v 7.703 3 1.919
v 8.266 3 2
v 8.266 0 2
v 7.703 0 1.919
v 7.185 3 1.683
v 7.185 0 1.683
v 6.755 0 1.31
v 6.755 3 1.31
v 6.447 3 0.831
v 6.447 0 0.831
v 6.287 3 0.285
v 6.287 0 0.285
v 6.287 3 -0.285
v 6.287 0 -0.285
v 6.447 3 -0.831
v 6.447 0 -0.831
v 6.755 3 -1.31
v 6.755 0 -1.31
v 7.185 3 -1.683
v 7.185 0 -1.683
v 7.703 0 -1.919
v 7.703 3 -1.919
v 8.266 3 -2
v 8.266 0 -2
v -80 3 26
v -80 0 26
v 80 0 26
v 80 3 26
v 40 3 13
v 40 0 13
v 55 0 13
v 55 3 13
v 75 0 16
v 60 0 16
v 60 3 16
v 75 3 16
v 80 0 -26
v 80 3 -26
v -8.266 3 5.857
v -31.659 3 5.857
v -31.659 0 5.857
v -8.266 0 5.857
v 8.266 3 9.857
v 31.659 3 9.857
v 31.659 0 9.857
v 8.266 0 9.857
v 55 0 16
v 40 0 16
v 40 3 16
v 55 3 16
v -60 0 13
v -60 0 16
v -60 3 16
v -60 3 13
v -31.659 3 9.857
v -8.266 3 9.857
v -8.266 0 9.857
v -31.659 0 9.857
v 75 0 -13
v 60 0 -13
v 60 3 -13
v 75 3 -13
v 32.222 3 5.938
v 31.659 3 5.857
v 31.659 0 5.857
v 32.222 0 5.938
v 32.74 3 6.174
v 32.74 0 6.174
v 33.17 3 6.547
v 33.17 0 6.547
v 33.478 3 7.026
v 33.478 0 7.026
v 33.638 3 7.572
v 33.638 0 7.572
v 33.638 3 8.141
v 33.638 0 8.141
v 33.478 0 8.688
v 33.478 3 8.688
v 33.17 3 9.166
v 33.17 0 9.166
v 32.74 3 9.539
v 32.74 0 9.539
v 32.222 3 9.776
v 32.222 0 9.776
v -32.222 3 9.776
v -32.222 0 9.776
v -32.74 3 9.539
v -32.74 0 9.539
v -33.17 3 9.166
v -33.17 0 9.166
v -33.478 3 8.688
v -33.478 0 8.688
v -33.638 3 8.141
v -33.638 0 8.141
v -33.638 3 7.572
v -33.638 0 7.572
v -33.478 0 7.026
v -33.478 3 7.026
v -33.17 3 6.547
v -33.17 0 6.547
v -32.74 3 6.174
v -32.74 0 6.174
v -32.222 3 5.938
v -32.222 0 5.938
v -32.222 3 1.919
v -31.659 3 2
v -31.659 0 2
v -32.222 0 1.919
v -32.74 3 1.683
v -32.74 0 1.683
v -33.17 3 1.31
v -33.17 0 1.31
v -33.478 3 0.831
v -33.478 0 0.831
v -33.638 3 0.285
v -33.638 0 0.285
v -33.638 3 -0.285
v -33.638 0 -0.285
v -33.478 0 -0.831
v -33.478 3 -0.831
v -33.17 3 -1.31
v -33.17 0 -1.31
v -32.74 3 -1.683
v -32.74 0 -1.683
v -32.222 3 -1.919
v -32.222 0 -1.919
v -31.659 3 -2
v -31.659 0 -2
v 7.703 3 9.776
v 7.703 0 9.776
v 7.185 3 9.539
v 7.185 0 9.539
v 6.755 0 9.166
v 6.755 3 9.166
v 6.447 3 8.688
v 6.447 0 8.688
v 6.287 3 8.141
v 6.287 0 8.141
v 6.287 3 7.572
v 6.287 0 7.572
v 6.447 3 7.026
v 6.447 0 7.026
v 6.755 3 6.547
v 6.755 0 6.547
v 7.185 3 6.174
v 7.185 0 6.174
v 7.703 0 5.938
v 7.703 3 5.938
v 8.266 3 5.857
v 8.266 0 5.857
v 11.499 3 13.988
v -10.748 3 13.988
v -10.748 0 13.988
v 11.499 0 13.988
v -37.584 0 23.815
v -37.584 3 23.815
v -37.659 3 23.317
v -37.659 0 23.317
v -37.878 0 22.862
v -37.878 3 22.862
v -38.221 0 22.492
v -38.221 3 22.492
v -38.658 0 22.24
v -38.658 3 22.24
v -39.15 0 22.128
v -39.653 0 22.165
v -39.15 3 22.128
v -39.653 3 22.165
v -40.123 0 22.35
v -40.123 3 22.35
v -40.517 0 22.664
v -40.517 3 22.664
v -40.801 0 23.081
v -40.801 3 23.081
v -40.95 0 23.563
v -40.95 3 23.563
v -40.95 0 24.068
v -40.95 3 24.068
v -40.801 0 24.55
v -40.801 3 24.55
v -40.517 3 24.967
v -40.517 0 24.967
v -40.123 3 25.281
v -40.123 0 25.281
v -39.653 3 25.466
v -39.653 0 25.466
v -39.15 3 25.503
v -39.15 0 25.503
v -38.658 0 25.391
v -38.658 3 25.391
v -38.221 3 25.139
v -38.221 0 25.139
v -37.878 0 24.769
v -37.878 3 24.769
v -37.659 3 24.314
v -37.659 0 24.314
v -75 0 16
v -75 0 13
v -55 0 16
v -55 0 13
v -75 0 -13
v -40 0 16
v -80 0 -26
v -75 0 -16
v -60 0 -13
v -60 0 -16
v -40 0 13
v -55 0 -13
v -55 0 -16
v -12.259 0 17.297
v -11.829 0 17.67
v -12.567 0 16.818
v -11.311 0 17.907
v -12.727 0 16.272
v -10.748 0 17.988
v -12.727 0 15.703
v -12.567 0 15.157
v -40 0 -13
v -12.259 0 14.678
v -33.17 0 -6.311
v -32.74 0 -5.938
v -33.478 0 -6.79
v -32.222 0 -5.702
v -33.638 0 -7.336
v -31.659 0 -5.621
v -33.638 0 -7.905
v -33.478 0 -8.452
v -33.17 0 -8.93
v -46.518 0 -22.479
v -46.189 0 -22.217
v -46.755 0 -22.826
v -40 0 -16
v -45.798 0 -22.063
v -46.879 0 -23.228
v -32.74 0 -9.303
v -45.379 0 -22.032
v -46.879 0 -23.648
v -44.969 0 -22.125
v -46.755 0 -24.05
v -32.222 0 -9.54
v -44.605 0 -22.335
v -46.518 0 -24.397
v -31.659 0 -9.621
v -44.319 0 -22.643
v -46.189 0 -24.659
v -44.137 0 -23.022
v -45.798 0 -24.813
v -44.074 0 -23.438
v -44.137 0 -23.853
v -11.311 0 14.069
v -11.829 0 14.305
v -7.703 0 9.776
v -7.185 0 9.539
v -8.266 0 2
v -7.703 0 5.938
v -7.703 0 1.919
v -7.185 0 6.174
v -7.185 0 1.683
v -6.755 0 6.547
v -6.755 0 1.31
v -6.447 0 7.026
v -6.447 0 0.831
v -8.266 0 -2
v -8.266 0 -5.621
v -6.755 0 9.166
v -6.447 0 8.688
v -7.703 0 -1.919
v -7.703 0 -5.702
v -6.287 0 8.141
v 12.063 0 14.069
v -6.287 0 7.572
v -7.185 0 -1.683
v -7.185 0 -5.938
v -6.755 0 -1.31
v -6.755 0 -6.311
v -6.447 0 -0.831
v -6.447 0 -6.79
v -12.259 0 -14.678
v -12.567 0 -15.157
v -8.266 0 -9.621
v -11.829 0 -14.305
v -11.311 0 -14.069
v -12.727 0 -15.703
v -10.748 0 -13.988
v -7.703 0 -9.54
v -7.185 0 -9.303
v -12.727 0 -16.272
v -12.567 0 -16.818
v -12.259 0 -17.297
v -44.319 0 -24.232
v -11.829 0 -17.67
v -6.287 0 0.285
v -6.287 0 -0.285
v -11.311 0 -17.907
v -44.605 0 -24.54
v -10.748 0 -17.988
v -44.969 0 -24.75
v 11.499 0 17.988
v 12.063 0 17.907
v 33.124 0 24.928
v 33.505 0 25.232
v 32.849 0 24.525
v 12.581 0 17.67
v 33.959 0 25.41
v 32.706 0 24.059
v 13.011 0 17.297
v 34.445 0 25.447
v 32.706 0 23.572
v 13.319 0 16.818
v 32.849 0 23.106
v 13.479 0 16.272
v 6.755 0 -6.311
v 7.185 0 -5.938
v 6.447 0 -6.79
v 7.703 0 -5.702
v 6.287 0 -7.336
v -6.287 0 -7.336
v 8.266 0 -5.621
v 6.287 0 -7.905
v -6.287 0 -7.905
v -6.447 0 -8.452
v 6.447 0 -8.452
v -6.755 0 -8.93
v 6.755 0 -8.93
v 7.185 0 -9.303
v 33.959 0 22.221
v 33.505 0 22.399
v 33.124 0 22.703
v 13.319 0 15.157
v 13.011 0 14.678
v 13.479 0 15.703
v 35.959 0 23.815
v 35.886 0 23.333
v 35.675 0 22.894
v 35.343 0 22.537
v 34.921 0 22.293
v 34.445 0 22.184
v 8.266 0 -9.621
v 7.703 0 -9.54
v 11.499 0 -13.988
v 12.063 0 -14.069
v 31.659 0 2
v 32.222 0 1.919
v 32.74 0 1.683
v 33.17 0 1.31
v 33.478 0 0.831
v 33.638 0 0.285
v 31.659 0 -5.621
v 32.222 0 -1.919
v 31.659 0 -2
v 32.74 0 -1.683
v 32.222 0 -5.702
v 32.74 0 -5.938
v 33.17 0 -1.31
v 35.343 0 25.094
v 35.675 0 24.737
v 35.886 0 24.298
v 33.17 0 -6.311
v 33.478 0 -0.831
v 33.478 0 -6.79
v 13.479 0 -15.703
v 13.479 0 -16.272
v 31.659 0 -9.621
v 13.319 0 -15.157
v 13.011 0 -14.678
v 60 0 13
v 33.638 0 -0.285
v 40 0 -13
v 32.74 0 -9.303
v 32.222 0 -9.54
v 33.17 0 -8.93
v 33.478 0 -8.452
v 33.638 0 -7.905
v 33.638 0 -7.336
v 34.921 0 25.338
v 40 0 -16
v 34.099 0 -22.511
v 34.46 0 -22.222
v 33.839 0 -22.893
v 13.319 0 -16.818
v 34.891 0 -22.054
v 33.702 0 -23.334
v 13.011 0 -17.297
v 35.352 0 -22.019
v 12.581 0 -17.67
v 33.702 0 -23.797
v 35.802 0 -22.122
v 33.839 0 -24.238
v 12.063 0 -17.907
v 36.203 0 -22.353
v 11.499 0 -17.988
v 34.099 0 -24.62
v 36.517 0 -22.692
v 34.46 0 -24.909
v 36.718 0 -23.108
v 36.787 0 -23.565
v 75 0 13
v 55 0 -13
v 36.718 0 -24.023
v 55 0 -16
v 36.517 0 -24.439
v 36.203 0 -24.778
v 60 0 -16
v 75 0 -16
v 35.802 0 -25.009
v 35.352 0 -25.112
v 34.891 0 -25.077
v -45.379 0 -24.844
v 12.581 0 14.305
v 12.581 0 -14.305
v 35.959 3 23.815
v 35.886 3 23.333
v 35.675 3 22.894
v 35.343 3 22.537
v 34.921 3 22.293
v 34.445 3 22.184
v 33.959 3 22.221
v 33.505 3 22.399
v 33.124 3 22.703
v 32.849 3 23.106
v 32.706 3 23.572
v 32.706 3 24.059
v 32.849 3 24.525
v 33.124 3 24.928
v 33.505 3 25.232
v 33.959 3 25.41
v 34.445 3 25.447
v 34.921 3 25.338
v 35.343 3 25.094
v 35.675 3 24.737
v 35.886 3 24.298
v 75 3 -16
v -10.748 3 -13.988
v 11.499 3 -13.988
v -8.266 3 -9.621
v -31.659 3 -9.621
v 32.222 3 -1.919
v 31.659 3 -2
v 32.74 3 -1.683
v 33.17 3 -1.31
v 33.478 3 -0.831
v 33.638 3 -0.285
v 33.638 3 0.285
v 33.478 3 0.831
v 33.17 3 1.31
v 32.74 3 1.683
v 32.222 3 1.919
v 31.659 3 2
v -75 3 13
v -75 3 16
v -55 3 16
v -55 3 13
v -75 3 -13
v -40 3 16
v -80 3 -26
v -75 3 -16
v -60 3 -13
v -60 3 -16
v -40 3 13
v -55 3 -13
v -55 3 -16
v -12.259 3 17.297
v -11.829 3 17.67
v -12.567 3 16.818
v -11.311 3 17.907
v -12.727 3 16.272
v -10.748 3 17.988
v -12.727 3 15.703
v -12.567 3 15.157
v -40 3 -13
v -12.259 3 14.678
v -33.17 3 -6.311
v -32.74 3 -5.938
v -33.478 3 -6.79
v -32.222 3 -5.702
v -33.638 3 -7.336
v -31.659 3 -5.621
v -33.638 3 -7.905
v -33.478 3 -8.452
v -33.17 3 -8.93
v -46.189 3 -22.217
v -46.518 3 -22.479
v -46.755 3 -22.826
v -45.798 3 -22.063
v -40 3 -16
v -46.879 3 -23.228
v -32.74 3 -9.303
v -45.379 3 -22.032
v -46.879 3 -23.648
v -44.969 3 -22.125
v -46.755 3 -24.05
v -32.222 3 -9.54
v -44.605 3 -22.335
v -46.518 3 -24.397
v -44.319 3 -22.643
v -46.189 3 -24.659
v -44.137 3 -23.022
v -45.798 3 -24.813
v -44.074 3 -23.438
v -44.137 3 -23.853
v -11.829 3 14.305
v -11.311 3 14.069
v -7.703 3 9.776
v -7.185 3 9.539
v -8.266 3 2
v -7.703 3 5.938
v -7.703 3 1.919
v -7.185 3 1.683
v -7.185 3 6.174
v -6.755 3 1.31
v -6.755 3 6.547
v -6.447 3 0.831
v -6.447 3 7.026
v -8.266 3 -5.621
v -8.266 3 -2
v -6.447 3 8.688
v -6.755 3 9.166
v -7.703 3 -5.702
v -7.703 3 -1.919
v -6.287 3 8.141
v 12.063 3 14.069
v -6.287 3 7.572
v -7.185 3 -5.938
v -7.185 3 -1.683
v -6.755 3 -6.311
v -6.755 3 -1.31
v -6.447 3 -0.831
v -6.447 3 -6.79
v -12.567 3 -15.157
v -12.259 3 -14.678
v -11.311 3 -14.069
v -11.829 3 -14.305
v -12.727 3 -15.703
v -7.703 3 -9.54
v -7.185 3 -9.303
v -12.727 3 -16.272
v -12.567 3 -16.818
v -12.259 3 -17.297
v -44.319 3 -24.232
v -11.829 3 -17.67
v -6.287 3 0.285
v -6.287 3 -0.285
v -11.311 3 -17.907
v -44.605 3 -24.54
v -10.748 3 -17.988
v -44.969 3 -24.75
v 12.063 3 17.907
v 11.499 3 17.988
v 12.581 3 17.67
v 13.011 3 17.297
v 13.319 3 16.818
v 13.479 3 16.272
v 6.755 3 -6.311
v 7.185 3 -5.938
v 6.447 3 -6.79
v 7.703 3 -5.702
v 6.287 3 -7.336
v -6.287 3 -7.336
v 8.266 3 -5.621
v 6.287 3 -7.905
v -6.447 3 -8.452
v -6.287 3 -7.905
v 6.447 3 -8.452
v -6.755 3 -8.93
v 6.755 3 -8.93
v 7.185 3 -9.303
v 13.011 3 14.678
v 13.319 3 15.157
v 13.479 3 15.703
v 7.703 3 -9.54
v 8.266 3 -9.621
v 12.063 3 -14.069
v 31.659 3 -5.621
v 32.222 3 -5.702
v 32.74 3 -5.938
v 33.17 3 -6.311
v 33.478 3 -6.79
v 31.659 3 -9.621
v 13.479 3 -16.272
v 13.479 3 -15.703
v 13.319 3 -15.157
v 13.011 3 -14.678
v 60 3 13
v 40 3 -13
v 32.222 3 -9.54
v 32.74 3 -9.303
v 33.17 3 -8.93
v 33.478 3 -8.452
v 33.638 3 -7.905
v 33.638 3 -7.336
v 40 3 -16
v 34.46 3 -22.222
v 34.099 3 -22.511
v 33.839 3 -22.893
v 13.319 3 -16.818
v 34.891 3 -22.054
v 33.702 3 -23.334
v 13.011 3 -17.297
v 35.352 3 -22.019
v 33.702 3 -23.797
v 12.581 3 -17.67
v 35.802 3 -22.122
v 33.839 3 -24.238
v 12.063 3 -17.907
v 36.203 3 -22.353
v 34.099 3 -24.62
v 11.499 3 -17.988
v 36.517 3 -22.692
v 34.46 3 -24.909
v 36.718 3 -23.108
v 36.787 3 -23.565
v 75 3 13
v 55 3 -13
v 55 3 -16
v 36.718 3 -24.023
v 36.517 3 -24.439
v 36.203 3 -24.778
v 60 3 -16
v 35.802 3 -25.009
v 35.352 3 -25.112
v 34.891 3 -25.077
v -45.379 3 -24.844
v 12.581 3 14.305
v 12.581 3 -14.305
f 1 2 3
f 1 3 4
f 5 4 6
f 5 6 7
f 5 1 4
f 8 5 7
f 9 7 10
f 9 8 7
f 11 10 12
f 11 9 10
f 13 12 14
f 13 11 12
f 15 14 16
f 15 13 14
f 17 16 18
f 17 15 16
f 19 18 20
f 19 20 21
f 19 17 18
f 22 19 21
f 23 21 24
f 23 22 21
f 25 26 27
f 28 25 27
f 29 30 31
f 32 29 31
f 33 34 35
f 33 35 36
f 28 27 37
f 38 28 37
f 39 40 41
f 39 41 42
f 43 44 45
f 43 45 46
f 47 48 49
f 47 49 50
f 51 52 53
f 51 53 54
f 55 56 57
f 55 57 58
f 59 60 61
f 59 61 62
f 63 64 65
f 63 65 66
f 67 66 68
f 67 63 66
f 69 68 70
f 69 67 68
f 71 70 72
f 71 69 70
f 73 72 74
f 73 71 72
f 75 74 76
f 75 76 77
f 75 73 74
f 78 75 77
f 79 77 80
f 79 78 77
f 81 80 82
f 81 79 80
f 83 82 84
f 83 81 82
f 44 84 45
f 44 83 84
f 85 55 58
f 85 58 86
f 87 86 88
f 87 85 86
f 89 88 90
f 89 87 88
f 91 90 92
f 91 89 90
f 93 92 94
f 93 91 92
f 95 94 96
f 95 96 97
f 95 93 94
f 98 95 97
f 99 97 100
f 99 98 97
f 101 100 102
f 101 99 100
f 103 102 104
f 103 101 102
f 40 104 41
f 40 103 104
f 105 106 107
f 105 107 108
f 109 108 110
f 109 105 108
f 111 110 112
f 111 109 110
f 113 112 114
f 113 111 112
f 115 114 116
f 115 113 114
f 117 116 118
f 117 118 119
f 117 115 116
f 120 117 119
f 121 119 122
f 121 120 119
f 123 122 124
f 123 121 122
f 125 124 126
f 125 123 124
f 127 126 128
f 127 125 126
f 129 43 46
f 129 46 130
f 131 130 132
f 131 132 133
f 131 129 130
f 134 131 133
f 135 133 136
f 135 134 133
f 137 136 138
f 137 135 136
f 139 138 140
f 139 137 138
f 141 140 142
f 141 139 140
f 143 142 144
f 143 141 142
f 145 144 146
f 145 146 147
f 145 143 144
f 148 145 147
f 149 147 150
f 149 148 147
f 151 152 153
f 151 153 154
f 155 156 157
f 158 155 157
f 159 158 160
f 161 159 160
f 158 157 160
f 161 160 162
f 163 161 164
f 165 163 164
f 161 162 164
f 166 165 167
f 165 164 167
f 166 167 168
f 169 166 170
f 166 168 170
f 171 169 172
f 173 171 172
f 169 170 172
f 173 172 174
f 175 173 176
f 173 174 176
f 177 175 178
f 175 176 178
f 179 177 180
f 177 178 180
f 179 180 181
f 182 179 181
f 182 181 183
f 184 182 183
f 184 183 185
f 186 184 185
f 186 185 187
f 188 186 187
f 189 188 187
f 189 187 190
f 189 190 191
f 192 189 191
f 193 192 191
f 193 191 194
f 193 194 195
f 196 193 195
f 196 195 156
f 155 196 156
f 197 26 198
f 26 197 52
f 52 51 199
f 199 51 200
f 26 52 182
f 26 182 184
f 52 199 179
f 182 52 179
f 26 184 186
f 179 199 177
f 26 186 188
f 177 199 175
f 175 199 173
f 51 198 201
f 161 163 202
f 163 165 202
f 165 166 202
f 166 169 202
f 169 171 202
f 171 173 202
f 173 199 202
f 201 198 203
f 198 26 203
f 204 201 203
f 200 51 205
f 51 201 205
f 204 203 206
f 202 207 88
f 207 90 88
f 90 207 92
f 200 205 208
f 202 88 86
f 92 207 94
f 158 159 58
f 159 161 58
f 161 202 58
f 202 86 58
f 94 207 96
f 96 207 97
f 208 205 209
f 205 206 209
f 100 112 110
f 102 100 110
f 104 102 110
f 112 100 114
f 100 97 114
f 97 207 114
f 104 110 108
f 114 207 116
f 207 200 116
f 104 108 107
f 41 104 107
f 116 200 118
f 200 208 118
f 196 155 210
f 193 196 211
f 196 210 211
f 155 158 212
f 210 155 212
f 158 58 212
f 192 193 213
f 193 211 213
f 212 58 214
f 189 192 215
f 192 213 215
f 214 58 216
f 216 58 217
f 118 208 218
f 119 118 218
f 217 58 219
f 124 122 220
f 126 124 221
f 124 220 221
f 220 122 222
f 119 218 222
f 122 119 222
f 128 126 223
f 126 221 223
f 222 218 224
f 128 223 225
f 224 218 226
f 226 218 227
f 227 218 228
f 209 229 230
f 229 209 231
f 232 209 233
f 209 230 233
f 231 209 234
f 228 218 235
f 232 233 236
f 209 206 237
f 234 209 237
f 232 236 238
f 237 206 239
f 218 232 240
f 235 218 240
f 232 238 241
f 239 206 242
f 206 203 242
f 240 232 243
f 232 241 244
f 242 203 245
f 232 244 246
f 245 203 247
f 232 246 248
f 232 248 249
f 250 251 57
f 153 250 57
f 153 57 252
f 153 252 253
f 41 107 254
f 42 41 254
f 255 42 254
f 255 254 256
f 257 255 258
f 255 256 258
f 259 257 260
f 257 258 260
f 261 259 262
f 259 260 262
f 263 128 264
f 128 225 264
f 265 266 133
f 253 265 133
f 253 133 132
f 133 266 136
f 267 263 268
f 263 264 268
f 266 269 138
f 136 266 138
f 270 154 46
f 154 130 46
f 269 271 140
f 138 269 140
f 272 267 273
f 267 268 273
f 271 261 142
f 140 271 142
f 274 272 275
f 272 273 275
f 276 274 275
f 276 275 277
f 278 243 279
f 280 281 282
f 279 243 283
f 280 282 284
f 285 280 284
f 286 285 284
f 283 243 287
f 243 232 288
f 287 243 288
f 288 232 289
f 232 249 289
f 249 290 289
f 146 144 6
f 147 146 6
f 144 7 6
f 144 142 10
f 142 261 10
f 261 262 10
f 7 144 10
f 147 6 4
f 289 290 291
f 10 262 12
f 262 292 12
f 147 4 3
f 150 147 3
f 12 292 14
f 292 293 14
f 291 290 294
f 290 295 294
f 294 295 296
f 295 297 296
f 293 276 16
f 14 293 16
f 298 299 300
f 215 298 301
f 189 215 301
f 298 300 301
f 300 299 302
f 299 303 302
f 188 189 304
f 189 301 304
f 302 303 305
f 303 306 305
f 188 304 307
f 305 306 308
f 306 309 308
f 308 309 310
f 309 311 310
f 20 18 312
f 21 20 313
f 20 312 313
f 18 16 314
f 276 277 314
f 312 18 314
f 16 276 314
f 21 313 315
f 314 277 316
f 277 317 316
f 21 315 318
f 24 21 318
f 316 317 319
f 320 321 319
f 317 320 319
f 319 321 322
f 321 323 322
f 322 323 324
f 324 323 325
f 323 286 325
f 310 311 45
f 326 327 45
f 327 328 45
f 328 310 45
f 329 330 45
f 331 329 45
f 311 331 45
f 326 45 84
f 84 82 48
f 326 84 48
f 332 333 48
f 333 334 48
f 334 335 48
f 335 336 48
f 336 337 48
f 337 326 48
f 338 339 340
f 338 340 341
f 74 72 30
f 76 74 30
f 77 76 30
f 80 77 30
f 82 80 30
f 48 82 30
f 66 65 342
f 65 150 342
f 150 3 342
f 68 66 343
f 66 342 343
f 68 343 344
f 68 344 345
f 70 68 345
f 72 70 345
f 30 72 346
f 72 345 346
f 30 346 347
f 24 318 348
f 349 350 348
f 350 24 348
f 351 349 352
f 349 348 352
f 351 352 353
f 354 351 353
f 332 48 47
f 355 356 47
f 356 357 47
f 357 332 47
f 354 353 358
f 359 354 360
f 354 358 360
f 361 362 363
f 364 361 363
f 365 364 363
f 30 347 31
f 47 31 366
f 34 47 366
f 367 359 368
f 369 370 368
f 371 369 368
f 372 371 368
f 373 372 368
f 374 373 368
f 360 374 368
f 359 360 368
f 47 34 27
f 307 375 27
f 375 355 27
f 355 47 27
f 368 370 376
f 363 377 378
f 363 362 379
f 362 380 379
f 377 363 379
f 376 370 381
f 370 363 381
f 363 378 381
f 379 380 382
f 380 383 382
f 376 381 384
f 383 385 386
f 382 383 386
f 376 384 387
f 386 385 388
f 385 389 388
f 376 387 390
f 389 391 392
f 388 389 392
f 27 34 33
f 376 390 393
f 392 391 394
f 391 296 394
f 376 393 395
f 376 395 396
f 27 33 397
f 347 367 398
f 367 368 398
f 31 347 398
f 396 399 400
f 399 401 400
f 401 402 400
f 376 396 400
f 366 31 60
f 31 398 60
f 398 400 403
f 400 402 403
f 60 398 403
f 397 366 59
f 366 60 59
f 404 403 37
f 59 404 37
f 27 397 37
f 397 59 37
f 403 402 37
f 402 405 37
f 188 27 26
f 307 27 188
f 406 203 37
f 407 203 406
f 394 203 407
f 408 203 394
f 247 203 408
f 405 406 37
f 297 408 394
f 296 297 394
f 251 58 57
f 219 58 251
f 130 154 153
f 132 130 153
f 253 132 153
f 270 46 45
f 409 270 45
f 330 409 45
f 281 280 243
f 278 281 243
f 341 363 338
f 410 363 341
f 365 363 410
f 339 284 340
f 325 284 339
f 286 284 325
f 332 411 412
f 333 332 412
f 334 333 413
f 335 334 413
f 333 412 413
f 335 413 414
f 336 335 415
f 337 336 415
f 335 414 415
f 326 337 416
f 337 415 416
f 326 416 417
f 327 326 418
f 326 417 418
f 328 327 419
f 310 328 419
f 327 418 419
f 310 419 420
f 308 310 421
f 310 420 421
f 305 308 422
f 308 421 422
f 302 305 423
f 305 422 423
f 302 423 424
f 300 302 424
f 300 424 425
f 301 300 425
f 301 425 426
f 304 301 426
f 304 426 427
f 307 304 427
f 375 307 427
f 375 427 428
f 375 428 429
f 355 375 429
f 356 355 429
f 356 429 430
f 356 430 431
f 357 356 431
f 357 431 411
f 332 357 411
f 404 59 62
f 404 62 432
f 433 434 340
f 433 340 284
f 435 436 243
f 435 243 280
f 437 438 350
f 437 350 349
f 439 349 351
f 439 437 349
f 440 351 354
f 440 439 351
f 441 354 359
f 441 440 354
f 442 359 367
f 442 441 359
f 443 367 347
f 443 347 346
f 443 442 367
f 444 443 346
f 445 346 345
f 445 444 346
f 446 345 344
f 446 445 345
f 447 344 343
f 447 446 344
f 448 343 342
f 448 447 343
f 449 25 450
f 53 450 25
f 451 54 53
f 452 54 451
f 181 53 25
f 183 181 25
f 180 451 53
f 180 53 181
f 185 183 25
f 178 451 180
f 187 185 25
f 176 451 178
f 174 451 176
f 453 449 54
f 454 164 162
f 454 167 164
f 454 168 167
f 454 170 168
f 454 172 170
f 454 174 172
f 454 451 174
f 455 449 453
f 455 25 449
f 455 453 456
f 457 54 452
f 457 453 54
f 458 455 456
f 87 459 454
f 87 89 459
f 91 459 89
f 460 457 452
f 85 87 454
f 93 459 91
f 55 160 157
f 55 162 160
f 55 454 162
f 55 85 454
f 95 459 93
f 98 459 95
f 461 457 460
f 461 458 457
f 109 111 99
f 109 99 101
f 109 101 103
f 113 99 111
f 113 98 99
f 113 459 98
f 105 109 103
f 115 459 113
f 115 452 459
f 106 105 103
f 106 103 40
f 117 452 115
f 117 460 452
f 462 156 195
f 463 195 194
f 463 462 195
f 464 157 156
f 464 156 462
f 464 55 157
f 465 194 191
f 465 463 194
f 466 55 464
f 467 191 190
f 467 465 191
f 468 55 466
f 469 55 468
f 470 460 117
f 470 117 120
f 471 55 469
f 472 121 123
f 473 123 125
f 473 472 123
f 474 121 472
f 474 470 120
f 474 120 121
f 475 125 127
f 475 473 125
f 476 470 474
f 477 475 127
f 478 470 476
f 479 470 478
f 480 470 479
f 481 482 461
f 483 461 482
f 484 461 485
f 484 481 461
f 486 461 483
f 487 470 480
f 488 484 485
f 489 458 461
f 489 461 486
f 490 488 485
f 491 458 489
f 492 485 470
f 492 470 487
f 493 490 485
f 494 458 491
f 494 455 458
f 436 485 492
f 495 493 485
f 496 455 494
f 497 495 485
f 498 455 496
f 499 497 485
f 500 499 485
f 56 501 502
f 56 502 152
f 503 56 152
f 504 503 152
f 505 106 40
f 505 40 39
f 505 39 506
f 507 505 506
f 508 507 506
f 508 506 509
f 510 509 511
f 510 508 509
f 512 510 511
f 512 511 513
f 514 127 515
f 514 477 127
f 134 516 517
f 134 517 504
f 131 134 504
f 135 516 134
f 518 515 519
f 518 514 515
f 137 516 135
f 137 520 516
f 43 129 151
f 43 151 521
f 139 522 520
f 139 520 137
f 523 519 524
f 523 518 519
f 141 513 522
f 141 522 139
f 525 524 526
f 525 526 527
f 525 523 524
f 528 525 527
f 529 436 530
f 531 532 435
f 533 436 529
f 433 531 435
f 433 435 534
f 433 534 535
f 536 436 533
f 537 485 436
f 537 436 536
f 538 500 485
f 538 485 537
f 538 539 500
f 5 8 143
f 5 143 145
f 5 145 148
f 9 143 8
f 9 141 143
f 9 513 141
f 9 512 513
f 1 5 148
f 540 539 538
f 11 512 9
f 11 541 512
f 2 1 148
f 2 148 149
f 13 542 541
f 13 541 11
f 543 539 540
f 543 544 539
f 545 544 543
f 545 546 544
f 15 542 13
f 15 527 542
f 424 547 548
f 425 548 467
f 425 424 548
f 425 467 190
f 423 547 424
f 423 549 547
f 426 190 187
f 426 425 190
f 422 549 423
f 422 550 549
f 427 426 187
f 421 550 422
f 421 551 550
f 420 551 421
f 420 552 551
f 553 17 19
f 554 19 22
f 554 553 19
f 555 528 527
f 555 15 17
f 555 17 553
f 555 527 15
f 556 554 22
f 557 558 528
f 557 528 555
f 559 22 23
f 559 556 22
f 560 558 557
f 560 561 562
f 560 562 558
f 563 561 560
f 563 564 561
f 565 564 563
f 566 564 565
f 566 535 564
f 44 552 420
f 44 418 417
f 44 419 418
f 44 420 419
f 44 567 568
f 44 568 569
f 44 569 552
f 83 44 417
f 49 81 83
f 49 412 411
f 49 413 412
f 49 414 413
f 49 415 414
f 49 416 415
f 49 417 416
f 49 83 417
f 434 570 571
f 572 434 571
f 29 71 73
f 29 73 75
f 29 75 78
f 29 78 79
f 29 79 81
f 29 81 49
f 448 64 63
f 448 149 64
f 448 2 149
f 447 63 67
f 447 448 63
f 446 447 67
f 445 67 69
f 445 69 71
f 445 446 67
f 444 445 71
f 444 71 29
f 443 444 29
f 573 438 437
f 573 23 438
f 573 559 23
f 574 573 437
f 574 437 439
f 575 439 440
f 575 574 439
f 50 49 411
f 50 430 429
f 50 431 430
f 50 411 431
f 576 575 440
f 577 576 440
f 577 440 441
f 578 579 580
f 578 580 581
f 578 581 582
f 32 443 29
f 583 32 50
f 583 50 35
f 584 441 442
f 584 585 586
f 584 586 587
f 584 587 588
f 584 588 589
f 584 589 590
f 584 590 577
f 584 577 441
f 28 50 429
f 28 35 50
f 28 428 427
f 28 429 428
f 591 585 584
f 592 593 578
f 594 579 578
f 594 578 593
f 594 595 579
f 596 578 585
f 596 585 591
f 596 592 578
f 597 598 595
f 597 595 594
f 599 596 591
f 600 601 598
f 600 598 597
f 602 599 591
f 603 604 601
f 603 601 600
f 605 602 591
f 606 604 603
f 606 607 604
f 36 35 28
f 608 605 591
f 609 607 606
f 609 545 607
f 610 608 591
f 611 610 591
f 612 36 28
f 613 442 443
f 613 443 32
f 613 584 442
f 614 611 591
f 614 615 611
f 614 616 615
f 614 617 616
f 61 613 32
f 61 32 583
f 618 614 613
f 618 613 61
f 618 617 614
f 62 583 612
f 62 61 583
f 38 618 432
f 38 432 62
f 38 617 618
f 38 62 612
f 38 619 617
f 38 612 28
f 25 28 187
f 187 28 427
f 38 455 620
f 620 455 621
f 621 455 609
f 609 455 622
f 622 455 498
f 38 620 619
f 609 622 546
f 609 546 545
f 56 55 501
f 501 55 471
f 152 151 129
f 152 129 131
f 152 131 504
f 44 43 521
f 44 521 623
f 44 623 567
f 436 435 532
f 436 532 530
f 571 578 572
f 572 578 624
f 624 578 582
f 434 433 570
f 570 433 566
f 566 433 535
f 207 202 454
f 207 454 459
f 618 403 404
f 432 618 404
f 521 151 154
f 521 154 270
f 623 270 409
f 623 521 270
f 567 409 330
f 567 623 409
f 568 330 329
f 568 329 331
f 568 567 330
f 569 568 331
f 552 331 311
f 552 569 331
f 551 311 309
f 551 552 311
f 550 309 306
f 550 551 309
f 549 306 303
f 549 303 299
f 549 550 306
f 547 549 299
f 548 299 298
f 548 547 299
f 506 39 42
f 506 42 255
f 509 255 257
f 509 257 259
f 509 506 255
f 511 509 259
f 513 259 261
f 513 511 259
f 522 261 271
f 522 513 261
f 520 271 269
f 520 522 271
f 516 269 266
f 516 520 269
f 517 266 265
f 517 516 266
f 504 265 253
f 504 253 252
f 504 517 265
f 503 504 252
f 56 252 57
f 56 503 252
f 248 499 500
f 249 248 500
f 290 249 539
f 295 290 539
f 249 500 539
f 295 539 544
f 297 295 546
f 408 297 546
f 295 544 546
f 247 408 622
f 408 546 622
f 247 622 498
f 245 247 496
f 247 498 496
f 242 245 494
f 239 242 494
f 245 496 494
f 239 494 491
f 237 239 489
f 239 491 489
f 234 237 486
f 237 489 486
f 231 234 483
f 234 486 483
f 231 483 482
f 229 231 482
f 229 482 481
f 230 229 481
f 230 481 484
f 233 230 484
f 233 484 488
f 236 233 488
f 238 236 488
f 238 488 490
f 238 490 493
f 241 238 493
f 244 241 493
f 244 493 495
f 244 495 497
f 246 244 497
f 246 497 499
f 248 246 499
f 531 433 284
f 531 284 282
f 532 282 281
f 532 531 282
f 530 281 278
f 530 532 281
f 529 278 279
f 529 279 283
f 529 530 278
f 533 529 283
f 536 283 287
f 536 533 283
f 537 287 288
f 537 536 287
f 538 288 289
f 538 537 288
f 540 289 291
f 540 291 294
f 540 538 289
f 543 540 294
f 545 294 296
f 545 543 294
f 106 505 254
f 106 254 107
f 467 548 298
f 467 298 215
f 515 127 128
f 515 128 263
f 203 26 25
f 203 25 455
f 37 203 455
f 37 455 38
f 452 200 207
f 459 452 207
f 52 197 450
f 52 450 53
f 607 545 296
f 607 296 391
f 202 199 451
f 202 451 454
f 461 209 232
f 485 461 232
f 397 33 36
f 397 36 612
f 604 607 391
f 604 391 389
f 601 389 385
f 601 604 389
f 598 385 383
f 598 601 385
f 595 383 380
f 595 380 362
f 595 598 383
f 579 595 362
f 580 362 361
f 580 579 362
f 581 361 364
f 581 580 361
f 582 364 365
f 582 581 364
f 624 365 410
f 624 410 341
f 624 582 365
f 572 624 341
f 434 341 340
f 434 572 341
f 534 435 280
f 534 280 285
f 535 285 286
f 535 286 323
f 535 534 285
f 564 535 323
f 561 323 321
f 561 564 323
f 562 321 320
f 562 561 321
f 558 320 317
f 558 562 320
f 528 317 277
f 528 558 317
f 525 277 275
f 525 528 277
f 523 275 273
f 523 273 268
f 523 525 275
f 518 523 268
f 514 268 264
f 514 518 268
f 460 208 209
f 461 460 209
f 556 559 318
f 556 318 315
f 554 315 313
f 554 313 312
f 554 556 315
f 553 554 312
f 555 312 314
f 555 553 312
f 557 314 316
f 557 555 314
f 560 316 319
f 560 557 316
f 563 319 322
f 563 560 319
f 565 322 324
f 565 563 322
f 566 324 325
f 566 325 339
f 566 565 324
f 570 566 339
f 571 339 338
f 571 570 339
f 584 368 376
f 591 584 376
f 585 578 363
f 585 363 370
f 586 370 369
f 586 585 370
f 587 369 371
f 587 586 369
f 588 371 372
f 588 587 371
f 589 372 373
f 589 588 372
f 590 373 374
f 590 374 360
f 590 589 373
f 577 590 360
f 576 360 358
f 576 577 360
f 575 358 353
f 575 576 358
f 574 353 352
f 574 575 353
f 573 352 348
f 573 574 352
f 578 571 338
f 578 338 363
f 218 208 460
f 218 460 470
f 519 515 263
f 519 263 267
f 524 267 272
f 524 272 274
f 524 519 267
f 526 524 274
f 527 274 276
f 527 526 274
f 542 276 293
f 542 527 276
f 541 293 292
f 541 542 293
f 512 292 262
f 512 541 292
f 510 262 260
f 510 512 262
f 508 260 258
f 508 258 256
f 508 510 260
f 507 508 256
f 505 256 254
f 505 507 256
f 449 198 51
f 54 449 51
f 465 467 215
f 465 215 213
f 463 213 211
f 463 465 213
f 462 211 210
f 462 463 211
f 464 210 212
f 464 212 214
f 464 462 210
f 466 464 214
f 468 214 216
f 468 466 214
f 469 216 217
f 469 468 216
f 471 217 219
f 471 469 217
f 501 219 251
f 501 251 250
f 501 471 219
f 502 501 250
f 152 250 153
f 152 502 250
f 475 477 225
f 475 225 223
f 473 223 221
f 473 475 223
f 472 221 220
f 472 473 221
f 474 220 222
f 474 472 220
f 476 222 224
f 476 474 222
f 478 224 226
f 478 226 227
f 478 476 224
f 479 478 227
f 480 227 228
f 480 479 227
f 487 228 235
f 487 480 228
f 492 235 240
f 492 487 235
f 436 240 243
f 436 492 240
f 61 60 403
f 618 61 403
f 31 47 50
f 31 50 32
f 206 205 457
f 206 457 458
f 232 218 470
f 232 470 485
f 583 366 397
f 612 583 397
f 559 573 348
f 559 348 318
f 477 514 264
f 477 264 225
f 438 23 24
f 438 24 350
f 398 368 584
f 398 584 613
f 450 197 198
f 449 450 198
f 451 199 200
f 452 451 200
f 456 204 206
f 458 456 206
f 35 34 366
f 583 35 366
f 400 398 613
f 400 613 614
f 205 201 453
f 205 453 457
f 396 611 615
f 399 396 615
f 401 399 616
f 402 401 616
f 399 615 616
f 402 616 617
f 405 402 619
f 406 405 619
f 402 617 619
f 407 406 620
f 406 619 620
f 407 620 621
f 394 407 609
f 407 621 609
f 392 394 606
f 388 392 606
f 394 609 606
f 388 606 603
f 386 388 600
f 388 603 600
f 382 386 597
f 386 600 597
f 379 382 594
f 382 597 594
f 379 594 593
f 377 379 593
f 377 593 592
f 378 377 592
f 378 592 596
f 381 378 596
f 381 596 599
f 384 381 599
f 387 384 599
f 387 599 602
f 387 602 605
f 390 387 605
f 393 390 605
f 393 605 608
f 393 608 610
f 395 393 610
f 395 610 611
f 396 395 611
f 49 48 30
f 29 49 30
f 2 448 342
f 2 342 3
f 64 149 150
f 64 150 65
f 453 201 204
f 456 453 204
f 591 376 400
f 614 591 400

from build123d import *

# Parameters (mm, degrees)
SKETCH1_W           = 160
SKETCH1_H           = 52
SKETCH1_W_2         = 15
SKETCH1_H_2         = 3
BOSS_EXTRUDE1_DEPTH = 3
CUT_EXTRUDE1_DEPTH  = 3
SKETCH3_R           = 1.63582752
SKETCH3_R_2         = 1.692495787
SKETCH3_R_3         = 1.410083192
SKETCH3_R_4         = 1.550817753
CUT_EXTRUDE2_DEPTH  = 10


with BuildPart() as part:
    # Sketch1 → Boss-Extrude1 (new body)
    with BuildSketch(Plane(origin=(0, 0, 0), x_dir=(1, 0, 0), z_dir=(0, 1, 0))):
        Rectangle(SKETCH1_W, SKETCH1_H)
        with Locations((67.5, 14.5)):
            Rectangle(SKETCH1_W_2, SKETCH1_H_2, mode=Mode.SUBTRACT)
        with Locations((47.5, 14.5)):
            Rectangle(SKETCH1_W_2, SKETCH1_H_2, mode=Mode.SUBTRACT)
        with Locations((67.5, -14.5)):
            Rectangle(SKETCH1_W_2, SKETCH1_H_2, mode=Mode.SUBTRACT)
        with Locations((47.5, -14.5)):
            Rectangle(SKETCH1_W_2, SKETCH1_H_2, mode=Mode.SUBTRACT)
        with Locations((-47.5, -14.5)):
            Rectangle(SKETCH1_W_2, SKETCH1_H_2, mode=Mode.SUBTRACT)
        with Locations((-67.5, -14.5)):
            Rectangle(SKETCH1_W_2, SKETCH1_H_2, mode=Mode.SUBTRACT)
        with Locations((-47.5, 14.5)):
            Rectangle(SKETCH1_W_2, SKETCH1_H_2, mode=Mode.SUBTRACT)
        with Locations((-67.5, 14.5)):
            Rectangle(SKETCH1_W_2, SKETCH1_H_2, mode=Mode.SUBTRACT)
    extrude(amount=BOSS_EXTRUDE1_DEPTH)

    # Sketch2 → Cut-Extrude1 (cut)
    with BuildSketch(Plane(origin=(0, 3, 0), x_dir=(1, 0, 0), z_dir=(0, 1, 0))):
        with BuildLine():
            Line((-31.658505885, 2), (-8.266387648, 2))
            ThreePointArc((-8.266387648, 2), (-6.266387648, 0), (-8.266387648, -2))
            Line((-8.266387648, -2), (-31.658505885, -2))
            ThreePointArc((-31.658505885, -2), (-33.658505885, 0), (-31.658505885, 2))
        make_face()
        with BuildLine():
            Line((31.658505885, -9.856733432), (8.266387648, -9.856733432))
            ThreePointArc((8.266387648, -9.856733432), (6.266387648, -7.856733432), (8.266387648, -5.856733432))
            Line((8.266387648, -5.856733432), (31.658505885, -5.856733432))
            ThreePointArc((31.658505885, -5.856733432), (33.658505885, -7.856733432), (31.658505885, -9.856733432))
        make_face()
        with BuildLine():
            Line((-10.747740664, 17.987567994), (11.499478158, 17.987567994))
            ThreePointArc((11.499478158, 17.987567994), (13.499478158, 15.987567994), (11.499478158, 13.987567994))
            Line((11.499478158, 13.987567994), (-10.747740664, 13.987567994))
            ThreePointArc((-10.747740664, 13.987567994), (-12.747740664, 15.987567994), (-10.747740664, 17.987567994))
        make_face()
        with BuildLine():
            Line((-31.658505885, 9.620758334), (-8.266387648, 9.620758334))
            ThreePointArc((-8.266387648, 9.620758334), (-6.266387648, 7.620758334), (-8.266387648, 5.620758334))
            Line((-8.266387648, 5.620758334), (-31.658505885, 5.620758334))
            ThreePointArc((-31.658505885, 5.620758334), (-33.658505885, 7.620758334), (-31.658505885, 9.620758334))
        make_face()
        with BuildLine():
            Line((31.658505885, 5.620758334), (8.266387648, 5.620758334))
            ThreePointArc((8.266387648, 5.620758334), (6.266387648, 7.620758334), (8.266387648, 9.620758334))
            Line((8.266387648, 9.620758334), (31.658505885, 9.620758334))
            ThreePointArc((31.658505885, 9.620758334), (33.658505885, 7.620758334), (31.658505885, 5.620758334))
        make_face()
        with BuildLine():
            Line((-31.658505885, -5.856733432), (-8.266387648, -5.856733432))
            ThreePointArc((-8.266387648, -5.856733432), (-6.266387648, -7.856733432), (-8.266387648, -9.856733432))
            Line((-8.266387648, -9.856733432), (-31.658505885, -9.856733432))
            ThreePointArc((-31.658505885, -9.856733432), (-33.658505885, -7.856733432), (-31.658505885, -5.856733432))
        make_face()
        with BuildLine():
            Line((31.658505885, -2), (8.266387648, -2))
            ThreePointArc((8.266387648, -2), (6.266387648, 0), (8.266387648, 2))
            Line((8.266387648, 2), (31.658505885, 2))
            ThreePointArc((31.658505885, 2), (33.658505885, 0), (31.658505885, -2))
        make_face()
        with BuildLine():
            Line((-10.747740664, -13.987567994), (11.499478158, -13.987567994))
            ThreePointArc((11.499478158, -13.987567994), (13.499478158, -15.987567994), (11.499478158, -17.987567994))
            Line((11.499478158, -17.987567994), (-10.747740664, -17.987567994))
            ThreePointArc((-10.747740664, -17.987567994), (-12.747740664, -15.987567994), (-10.747740664, -13.987567994))
        make_face()
    extrude(amount=-CUT_EXTRUDE1_DEPTH, mode=Mode.SUBTRACT)

    # Sketch3 → Cut-Extrude2 (cut)
    with BuildSketch(Plane(origin=(0, 3, 0), x_dir=(1, 0, 0), z_dir=(0, 1, 0))):
        with Locations((34.323103301, -23.81549711)):
            Circle(SKETCH3_R)
        with Locations((-39.276258797, -23.81549711)):
            Circle(SKETCH3_R_2)
        with Locations((-45.484369153, 23.437784188)):
            Circle(SKETCH3_R_3)
        with Locations((35.235754497, 23.565498985)):
            Circle(SKETCH3_R_4)
    extrude(amount=-CUT_EXTRUDE2_DEPTH, mode=Mode.SUBTRACT)


solid = part.part
